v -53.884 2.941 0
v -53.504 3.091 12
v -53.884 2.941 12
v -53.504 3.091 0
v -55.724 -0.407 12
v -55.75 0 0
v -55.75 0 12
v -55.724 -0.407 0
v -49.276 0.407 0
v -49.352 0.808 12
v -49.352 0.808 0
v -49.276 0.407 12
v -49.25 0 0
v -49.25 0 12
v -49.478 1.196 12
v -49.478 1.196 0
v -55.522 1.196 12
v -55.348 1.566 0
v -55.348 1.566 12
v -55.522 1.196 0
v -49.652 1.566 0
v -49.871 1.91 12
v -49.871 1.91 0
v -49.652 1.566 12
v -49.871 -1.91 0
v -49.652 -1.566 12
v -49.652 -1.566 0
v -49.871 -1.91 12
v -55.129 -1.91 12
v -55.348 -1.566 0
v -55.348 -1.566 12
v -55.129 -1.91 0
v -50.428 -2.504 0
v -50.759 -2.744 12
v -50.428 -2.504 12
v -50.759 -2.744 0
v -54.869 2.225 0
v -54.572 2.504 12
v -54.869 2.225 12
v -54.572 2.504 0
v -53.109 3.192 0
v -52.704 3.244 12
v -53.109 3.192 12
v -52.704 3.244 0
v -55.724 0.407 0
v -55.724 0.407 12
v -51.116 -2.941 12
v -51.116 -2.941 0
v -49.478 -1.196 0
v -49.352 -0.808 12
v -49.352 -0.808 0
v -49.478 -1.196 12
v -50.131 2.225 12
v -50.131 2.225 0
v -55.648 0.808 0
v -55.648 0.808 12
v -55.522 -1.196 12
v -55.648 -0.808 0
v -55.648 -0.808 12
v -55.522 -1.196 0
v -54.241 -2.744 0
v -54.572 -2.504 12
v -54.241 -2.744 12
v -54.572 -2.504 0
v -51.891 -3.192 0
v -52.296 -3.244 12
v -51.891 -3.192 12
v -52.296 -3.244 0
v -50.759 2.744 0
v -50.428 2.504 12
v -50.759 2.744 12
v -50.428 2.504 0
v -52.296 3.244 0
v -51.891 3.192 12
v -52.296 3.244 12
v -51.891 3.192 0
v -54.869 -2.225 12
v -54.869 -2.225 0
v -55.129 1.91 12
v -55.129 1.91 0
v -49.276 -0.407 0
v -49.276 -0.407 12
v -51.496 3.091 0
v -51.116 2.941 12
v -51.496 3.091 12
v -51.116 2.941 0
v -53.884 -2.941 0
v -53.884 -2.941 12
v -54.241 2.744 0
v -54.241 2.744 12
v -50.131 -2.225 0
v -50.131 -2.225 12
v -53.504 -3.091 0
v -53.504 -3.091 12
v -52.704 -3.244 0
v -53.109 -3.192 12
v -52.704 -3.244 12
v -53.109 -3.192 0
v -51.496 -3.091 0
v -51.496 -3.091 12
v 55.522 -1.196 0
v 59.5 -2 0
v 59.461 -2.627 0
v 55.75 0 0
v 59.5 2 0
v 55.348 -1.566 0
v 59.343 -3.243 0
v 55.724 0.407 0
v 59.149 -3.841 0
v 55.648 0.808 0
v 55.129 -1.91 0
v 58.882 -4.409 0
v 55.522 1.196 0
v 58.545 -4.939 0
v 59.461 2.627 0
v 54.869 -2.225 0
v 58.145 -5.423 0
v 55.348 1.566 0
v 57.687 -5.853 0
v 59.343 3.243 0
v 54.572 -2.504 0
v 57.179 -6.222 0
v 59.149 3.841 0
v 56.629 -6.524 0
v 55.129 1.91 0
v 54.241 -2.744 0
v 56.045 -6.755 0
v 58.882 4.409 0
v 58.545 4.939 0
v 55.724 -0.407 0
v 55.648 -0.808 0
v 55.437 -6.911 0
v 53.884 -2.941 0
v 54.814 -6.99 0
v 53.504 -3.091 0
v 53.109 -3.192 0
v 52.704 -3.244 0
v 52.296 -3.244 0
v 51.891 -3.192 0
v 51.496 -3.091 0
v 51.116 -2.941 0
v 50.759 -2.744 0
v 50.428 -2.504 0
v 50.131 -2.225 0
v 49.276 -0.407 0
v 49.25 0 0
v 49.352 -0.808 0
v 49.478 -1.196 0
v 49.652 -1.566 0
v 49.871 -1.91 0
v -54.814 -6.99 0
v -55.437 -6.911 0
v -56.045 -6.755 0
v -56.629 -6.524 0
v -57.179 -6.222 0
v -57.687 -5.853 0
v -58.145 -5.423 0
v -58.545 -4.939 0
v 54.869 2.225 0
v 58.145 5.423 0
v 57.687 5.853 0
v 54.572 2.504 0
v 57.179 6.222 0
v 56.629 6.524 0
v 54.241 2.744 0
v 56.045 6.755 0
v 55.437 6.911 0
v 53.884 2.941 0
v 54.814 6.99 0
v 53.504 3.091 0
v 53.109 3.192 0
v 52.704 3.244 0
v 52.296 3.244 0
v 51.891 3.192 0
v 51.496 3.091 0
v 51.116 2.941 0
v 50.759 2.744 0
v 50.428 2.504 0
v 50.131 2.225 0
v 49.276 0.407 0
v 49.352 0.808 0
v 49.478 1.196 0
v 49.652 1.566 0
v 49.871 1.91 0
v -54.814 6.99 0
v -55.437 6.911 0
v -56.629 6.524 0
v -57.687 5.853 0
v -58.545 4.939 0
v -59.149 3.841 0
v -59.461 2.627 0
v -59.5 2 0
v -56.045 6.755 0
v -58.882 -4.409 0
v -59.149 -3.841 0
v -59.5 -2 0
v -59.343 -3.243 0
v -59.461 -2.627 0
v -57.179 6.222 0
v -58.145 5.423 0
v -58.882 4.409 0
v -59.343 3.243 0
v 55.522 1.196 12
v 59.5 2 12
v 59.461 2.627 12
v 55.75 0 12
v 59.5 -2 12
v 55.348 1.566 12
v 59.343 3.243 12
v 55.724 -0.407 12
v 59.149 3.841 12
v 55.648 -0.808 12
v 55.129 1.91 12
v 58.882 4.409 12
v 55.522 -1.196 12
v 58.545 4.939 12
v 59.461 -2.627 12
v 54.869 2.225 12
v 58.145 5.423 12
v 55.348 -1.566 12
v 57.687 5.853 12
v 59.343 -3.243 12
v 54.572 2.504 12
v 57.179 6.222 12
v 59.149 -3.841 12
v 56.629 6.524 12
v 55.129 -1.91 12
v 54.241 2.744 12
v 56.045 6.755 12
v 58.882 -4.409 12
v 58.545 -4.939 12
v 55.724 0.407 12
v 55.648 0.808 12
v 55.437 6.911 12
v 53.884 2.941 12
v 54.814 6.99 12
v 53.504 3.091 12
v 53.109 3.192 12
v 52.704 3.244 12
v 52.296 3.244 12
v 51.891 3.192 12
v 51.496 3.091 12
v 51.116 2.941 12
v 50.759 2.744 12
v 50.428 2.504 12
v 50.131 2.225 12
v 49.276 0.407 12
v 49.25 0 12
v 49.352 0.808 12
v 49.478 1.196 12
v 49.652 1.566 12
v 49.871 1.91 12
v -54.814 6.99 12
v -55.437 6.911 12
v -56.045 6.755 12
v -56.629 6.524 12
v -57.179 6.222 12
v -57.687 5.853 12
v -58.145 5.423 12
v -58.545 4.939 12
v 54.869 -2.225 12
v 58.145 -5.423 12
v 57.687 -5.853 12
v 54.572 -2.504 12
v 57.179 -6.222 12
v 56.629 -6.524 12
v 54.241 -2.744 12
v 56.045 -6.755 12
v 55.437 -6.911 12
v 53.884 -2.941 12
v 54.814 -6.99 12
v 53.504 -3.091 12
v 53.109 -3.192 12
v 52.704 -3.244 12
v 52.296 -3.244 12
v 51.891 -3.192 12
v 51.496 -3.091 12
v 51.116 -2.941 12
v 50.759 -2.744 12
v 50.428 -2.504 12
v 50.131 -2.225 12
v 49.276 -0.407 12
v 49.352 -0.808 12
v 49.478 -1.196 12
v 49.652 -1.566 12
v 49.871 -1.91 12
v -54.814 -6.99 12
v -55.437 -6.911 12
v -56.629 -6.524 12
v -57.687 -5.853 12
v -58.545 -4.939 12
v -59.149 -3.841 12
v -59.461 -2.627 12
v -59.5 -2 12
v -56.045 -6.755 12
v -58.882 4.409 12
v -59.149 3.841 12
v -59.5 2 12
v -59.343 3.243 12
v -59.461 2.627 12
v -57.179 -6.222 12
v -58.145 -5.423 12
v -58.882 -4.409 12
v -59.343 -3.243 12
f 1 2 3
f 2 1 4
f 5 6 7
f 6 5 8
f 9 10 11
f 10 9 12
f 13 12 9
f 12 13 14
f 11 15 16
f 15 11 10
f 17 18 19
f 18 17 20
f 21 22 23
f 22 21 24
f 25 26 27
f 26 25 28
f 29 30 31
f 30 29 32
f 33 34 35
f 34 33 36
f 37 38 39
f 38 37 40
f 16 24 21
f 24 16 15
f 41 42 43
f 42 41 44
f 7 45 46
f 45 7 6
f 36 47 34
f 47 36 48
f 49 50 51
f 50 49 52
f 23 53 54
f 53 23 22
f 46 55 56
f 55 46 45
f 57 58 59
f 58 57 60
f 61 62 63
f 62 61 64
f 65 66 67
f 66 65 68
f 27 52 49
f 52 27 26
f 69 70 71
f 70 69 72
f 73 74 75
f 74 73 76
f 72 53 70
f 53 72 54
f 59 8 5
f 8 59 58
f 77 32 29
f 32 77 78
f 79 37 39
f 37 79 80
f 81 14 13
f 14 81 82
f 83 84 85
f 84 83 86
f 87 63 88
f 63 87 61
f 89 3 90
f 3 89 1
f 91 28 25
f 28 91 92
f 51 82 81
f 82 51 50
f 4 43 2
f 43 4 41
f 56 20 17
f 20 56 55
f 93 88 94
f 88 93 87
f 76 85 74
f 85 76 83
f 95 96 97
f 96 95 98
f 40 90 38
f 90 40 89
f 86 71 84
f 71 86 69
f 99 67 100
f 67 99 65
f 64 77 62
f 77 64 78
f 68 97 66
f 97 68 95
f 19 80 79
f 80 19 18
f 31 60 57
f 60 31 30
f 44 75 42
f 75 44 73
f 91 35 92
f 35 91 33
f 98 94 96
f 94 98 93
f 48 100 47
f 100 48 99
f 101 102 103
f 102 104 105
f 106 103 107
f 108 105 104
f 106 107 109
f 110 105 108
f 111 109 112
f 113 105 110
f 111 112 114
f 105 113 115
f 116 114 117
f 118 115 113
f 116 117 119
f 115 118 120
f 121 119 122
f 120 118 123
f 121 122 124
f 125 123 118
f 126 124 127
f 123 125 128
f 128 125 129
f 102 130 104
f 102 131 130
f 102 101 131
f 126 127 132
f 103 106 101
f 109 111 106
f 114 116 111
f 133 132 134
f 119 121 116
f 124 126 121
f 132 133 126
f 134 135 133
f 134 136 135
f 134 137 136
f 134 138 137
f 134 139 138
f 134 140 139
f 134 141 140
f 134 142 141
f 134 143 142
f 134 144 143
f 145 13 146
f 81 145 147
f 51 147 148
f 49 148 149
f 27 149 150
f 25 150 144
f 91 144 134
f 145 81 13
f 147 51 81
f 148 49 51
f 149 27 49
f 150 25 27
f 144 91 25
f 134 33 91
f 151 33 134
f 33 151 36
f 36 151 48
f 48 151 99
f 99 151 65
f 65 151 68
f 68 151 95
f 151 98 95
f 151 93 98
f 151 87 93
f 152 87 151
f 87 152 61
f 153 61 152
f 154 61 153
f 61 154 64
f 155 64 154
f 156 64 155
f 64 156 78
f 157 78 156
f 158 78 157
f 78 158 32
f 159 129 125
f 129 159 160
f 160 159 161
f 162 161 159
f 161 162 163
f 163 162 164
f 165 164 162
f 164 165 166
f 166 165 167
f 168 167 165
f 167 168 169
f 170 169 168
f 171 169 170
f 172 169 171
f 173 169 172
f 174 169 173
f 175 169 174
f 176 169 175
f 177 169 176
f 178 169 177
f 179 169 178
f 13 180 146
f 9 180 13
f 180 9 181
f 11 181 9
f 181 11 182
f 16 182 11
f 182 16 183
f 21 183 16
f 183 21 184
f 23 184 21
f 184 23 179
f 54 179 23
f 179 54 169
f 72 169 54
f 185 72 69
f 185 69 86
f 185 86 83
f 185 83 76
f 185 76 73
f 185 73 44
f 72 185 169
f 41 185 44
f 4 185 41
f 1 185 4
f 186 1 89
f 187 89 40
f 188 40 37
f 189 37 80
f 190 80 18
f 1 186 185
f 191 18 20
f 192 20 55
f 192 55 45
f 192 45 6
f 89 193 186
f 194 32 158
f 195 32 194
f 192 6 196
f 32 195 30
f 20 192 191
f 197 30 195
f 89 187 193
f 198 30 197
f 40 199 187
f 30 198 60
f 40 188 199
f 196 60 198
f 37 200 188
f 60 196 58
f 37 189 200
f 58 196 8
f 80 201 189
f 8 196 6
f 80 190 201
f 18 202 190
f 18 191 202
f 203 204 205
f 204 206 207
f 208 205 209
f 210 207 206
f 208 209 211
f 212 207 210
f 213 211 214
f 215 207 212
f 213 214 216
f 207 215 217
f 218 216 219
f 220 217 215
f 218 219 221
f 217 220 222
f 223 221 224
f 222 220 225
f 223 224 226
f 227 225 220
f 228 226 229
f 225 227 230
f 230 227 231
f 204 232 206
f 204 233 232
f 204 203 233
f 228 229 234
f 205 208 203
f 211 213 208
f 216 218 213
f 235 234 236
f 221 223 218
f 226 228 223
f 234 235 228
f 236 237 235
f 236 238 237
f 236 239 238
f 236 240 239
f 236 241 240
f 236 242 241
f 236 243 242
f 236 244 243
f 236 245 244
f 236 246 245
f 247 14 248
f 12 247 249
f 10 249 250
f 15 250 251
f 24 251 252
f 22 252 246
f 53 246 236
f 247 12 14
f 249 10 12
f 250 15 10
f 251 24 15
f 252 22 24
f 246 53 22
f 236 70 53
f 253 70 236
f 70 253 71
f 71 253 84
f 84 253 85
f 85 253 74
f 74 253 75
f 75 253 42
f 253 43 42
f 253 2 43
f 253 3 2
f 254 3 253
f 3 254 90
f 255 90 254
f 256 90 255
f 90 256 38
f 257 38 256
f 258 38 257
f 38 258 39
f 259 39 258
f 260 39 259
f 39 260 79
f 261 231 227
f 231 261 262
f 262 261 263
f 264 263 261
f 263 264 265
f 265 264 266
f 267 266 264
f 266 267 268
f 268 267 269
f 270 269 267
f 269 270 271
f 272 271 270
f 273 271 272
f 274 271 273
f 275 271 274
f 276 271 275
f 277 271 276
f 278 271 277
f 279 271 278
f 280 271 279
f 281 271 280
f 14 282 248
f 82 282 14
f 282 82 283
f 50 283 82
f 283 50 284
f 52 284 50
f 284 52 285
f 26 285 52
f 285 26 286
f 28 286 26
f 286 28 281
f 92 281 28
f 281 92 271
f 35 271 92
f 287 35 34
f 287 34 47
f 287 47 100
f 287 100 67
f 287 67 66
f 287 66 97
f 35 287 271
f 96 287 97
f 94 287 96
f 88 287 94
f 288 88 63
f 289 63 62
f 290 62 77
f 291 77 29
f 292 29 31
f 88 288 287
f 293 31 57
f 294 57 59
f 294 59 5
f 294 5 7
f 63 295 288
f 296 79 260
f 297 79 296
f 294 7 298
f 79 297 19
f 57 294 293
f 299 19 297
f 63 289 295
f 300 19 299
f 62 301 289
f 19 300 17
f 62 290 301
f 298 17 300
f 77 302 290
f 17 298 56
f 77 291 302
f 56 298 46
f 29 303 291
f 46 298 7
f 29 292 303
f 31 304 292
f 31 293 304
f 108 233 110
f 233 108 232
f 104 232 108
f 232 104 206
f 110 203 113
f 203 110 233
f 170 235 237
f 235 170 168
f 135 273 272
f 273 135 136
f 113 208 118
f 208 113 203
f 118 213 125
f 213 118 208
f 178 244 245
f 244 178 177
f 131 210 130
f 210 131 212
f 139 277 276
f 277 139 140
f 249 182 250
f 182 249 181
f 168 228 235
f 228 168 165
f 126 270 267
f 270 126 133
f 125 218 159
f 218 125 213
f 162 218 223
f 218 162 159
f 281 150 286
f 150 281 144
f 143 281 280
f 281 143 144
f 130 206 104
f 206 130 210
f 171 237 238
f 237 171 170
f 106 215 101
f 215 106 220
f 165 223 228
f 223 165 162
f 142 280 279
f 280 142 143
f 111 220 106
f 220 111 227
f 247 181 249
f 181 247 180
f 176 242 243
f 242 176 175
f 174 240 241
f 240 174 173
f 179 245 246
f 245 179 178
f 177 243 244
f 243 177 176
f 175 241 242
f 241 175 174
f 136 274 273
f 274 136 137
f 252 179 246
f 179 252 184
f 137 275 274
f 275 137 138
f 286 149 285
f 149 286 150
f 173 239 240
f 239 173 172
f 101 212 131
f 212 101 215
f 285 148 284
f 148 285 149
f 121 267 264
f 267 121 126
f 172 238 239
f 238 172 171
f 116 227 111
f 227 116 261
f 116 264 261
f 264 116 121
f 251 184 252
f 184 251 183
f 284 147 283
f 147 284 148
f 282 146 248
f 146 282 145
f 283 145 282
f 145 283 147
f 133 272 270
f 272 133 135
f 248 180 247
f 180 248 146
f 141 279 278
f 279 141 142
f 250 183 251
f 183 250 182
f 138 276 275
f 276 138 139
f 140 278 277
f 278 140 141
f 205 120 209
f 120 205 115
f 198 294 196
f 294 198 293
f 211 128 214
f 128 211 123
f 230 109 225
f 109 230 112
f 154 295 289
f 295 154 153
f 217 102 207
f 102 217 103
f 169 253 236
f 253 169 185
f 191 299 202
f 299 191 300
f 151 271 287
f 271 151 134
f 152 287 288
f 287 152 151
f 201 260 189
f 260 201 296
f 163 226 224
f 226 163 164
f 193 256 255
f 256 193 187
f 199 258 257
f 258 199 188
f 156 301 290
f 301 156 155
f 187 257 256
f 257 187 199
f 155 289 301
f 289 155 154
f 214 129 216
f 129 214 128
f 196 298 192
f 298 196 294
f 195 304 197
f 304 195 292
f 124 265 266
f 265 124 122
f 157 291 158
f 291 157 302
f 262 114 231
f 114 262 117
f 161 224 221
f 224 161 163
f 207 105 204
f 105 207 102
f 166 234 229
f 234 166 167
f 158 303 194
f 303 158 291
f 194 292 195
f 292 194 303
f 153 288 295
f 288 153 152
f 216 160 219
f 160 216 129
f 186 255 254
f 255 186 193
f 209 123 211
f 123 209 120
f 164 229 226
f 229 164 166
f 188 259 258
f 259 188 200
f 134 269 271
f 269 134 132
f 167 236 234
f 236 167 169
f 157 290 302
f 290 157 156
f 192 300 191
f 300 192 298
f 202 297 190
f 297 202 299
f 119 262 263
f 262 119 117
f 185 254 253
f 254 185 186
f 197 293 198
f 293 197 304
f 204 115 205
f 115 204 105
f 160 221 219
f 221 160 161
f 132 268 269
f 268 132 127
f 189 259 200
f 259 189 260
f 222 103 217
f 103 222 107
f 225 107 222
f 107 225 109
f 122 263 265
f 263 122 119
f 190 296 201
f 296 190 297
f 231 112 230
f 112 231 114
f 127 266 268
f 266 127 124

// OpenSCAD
$fn = 50;


difference() {
	union() {
		hull() {
			translate(v = [-54.5000000000, 2.0000000000, 0]) {
				cylinder(h = 12, r = 5);
			}
			translate(v = [54.5000000000, 2.0000000000, 0]) {
				cylinder(h = 12, r = 5);
			}
			translate(v = [-54.5000000000, -2.0000000000, 0]) {
				cylinder(h = 12, r = 5);
			}
			translate(v = [54.5000000000, -2.0000000000, 0]) {
				cylinder(h = 12, r = 5);
			}
		}
	}
	union() {
		translate(v = [-52.5000000000, 0.0000000000, 0]) {
			cylinder(h = 12, r = 3.2500000000);
		}
		translate(v = [52.5000000000, 0.0000000000, 0]) {
			cylinder(h = 12, r = 3.2500000000);
		}
		translate(v = [-52.5000000000, 0.0000000000, 0]) {
			cylinder(h = 12, r = 1.8000000000);
		}
		translate(v = [52.5000000000, 0.0000000000, 0]) {
			cylinder(h = 12, r = 1.8000000000);
		}
		translate(v = [-52.5000000000, 0.0000000000, 0]) {
			cylinder(h = 12, r = 1.8000000000);
		}
		translate(v = [52.5000000000, 0.0000000000, 0]) {
			cylinder(h = 12, r = 1.8000000000);
		}
		translate(v = [-52.5000000000, 0.0000000000, 0]) {
			cylinder(h = 12, r = 1.8000000000);
		}
		translate(v = [52.5000000000, 0.0000000000, 0]) {
			cylinder(h = 12, r = 1.8000000000);
		}
	}
}
